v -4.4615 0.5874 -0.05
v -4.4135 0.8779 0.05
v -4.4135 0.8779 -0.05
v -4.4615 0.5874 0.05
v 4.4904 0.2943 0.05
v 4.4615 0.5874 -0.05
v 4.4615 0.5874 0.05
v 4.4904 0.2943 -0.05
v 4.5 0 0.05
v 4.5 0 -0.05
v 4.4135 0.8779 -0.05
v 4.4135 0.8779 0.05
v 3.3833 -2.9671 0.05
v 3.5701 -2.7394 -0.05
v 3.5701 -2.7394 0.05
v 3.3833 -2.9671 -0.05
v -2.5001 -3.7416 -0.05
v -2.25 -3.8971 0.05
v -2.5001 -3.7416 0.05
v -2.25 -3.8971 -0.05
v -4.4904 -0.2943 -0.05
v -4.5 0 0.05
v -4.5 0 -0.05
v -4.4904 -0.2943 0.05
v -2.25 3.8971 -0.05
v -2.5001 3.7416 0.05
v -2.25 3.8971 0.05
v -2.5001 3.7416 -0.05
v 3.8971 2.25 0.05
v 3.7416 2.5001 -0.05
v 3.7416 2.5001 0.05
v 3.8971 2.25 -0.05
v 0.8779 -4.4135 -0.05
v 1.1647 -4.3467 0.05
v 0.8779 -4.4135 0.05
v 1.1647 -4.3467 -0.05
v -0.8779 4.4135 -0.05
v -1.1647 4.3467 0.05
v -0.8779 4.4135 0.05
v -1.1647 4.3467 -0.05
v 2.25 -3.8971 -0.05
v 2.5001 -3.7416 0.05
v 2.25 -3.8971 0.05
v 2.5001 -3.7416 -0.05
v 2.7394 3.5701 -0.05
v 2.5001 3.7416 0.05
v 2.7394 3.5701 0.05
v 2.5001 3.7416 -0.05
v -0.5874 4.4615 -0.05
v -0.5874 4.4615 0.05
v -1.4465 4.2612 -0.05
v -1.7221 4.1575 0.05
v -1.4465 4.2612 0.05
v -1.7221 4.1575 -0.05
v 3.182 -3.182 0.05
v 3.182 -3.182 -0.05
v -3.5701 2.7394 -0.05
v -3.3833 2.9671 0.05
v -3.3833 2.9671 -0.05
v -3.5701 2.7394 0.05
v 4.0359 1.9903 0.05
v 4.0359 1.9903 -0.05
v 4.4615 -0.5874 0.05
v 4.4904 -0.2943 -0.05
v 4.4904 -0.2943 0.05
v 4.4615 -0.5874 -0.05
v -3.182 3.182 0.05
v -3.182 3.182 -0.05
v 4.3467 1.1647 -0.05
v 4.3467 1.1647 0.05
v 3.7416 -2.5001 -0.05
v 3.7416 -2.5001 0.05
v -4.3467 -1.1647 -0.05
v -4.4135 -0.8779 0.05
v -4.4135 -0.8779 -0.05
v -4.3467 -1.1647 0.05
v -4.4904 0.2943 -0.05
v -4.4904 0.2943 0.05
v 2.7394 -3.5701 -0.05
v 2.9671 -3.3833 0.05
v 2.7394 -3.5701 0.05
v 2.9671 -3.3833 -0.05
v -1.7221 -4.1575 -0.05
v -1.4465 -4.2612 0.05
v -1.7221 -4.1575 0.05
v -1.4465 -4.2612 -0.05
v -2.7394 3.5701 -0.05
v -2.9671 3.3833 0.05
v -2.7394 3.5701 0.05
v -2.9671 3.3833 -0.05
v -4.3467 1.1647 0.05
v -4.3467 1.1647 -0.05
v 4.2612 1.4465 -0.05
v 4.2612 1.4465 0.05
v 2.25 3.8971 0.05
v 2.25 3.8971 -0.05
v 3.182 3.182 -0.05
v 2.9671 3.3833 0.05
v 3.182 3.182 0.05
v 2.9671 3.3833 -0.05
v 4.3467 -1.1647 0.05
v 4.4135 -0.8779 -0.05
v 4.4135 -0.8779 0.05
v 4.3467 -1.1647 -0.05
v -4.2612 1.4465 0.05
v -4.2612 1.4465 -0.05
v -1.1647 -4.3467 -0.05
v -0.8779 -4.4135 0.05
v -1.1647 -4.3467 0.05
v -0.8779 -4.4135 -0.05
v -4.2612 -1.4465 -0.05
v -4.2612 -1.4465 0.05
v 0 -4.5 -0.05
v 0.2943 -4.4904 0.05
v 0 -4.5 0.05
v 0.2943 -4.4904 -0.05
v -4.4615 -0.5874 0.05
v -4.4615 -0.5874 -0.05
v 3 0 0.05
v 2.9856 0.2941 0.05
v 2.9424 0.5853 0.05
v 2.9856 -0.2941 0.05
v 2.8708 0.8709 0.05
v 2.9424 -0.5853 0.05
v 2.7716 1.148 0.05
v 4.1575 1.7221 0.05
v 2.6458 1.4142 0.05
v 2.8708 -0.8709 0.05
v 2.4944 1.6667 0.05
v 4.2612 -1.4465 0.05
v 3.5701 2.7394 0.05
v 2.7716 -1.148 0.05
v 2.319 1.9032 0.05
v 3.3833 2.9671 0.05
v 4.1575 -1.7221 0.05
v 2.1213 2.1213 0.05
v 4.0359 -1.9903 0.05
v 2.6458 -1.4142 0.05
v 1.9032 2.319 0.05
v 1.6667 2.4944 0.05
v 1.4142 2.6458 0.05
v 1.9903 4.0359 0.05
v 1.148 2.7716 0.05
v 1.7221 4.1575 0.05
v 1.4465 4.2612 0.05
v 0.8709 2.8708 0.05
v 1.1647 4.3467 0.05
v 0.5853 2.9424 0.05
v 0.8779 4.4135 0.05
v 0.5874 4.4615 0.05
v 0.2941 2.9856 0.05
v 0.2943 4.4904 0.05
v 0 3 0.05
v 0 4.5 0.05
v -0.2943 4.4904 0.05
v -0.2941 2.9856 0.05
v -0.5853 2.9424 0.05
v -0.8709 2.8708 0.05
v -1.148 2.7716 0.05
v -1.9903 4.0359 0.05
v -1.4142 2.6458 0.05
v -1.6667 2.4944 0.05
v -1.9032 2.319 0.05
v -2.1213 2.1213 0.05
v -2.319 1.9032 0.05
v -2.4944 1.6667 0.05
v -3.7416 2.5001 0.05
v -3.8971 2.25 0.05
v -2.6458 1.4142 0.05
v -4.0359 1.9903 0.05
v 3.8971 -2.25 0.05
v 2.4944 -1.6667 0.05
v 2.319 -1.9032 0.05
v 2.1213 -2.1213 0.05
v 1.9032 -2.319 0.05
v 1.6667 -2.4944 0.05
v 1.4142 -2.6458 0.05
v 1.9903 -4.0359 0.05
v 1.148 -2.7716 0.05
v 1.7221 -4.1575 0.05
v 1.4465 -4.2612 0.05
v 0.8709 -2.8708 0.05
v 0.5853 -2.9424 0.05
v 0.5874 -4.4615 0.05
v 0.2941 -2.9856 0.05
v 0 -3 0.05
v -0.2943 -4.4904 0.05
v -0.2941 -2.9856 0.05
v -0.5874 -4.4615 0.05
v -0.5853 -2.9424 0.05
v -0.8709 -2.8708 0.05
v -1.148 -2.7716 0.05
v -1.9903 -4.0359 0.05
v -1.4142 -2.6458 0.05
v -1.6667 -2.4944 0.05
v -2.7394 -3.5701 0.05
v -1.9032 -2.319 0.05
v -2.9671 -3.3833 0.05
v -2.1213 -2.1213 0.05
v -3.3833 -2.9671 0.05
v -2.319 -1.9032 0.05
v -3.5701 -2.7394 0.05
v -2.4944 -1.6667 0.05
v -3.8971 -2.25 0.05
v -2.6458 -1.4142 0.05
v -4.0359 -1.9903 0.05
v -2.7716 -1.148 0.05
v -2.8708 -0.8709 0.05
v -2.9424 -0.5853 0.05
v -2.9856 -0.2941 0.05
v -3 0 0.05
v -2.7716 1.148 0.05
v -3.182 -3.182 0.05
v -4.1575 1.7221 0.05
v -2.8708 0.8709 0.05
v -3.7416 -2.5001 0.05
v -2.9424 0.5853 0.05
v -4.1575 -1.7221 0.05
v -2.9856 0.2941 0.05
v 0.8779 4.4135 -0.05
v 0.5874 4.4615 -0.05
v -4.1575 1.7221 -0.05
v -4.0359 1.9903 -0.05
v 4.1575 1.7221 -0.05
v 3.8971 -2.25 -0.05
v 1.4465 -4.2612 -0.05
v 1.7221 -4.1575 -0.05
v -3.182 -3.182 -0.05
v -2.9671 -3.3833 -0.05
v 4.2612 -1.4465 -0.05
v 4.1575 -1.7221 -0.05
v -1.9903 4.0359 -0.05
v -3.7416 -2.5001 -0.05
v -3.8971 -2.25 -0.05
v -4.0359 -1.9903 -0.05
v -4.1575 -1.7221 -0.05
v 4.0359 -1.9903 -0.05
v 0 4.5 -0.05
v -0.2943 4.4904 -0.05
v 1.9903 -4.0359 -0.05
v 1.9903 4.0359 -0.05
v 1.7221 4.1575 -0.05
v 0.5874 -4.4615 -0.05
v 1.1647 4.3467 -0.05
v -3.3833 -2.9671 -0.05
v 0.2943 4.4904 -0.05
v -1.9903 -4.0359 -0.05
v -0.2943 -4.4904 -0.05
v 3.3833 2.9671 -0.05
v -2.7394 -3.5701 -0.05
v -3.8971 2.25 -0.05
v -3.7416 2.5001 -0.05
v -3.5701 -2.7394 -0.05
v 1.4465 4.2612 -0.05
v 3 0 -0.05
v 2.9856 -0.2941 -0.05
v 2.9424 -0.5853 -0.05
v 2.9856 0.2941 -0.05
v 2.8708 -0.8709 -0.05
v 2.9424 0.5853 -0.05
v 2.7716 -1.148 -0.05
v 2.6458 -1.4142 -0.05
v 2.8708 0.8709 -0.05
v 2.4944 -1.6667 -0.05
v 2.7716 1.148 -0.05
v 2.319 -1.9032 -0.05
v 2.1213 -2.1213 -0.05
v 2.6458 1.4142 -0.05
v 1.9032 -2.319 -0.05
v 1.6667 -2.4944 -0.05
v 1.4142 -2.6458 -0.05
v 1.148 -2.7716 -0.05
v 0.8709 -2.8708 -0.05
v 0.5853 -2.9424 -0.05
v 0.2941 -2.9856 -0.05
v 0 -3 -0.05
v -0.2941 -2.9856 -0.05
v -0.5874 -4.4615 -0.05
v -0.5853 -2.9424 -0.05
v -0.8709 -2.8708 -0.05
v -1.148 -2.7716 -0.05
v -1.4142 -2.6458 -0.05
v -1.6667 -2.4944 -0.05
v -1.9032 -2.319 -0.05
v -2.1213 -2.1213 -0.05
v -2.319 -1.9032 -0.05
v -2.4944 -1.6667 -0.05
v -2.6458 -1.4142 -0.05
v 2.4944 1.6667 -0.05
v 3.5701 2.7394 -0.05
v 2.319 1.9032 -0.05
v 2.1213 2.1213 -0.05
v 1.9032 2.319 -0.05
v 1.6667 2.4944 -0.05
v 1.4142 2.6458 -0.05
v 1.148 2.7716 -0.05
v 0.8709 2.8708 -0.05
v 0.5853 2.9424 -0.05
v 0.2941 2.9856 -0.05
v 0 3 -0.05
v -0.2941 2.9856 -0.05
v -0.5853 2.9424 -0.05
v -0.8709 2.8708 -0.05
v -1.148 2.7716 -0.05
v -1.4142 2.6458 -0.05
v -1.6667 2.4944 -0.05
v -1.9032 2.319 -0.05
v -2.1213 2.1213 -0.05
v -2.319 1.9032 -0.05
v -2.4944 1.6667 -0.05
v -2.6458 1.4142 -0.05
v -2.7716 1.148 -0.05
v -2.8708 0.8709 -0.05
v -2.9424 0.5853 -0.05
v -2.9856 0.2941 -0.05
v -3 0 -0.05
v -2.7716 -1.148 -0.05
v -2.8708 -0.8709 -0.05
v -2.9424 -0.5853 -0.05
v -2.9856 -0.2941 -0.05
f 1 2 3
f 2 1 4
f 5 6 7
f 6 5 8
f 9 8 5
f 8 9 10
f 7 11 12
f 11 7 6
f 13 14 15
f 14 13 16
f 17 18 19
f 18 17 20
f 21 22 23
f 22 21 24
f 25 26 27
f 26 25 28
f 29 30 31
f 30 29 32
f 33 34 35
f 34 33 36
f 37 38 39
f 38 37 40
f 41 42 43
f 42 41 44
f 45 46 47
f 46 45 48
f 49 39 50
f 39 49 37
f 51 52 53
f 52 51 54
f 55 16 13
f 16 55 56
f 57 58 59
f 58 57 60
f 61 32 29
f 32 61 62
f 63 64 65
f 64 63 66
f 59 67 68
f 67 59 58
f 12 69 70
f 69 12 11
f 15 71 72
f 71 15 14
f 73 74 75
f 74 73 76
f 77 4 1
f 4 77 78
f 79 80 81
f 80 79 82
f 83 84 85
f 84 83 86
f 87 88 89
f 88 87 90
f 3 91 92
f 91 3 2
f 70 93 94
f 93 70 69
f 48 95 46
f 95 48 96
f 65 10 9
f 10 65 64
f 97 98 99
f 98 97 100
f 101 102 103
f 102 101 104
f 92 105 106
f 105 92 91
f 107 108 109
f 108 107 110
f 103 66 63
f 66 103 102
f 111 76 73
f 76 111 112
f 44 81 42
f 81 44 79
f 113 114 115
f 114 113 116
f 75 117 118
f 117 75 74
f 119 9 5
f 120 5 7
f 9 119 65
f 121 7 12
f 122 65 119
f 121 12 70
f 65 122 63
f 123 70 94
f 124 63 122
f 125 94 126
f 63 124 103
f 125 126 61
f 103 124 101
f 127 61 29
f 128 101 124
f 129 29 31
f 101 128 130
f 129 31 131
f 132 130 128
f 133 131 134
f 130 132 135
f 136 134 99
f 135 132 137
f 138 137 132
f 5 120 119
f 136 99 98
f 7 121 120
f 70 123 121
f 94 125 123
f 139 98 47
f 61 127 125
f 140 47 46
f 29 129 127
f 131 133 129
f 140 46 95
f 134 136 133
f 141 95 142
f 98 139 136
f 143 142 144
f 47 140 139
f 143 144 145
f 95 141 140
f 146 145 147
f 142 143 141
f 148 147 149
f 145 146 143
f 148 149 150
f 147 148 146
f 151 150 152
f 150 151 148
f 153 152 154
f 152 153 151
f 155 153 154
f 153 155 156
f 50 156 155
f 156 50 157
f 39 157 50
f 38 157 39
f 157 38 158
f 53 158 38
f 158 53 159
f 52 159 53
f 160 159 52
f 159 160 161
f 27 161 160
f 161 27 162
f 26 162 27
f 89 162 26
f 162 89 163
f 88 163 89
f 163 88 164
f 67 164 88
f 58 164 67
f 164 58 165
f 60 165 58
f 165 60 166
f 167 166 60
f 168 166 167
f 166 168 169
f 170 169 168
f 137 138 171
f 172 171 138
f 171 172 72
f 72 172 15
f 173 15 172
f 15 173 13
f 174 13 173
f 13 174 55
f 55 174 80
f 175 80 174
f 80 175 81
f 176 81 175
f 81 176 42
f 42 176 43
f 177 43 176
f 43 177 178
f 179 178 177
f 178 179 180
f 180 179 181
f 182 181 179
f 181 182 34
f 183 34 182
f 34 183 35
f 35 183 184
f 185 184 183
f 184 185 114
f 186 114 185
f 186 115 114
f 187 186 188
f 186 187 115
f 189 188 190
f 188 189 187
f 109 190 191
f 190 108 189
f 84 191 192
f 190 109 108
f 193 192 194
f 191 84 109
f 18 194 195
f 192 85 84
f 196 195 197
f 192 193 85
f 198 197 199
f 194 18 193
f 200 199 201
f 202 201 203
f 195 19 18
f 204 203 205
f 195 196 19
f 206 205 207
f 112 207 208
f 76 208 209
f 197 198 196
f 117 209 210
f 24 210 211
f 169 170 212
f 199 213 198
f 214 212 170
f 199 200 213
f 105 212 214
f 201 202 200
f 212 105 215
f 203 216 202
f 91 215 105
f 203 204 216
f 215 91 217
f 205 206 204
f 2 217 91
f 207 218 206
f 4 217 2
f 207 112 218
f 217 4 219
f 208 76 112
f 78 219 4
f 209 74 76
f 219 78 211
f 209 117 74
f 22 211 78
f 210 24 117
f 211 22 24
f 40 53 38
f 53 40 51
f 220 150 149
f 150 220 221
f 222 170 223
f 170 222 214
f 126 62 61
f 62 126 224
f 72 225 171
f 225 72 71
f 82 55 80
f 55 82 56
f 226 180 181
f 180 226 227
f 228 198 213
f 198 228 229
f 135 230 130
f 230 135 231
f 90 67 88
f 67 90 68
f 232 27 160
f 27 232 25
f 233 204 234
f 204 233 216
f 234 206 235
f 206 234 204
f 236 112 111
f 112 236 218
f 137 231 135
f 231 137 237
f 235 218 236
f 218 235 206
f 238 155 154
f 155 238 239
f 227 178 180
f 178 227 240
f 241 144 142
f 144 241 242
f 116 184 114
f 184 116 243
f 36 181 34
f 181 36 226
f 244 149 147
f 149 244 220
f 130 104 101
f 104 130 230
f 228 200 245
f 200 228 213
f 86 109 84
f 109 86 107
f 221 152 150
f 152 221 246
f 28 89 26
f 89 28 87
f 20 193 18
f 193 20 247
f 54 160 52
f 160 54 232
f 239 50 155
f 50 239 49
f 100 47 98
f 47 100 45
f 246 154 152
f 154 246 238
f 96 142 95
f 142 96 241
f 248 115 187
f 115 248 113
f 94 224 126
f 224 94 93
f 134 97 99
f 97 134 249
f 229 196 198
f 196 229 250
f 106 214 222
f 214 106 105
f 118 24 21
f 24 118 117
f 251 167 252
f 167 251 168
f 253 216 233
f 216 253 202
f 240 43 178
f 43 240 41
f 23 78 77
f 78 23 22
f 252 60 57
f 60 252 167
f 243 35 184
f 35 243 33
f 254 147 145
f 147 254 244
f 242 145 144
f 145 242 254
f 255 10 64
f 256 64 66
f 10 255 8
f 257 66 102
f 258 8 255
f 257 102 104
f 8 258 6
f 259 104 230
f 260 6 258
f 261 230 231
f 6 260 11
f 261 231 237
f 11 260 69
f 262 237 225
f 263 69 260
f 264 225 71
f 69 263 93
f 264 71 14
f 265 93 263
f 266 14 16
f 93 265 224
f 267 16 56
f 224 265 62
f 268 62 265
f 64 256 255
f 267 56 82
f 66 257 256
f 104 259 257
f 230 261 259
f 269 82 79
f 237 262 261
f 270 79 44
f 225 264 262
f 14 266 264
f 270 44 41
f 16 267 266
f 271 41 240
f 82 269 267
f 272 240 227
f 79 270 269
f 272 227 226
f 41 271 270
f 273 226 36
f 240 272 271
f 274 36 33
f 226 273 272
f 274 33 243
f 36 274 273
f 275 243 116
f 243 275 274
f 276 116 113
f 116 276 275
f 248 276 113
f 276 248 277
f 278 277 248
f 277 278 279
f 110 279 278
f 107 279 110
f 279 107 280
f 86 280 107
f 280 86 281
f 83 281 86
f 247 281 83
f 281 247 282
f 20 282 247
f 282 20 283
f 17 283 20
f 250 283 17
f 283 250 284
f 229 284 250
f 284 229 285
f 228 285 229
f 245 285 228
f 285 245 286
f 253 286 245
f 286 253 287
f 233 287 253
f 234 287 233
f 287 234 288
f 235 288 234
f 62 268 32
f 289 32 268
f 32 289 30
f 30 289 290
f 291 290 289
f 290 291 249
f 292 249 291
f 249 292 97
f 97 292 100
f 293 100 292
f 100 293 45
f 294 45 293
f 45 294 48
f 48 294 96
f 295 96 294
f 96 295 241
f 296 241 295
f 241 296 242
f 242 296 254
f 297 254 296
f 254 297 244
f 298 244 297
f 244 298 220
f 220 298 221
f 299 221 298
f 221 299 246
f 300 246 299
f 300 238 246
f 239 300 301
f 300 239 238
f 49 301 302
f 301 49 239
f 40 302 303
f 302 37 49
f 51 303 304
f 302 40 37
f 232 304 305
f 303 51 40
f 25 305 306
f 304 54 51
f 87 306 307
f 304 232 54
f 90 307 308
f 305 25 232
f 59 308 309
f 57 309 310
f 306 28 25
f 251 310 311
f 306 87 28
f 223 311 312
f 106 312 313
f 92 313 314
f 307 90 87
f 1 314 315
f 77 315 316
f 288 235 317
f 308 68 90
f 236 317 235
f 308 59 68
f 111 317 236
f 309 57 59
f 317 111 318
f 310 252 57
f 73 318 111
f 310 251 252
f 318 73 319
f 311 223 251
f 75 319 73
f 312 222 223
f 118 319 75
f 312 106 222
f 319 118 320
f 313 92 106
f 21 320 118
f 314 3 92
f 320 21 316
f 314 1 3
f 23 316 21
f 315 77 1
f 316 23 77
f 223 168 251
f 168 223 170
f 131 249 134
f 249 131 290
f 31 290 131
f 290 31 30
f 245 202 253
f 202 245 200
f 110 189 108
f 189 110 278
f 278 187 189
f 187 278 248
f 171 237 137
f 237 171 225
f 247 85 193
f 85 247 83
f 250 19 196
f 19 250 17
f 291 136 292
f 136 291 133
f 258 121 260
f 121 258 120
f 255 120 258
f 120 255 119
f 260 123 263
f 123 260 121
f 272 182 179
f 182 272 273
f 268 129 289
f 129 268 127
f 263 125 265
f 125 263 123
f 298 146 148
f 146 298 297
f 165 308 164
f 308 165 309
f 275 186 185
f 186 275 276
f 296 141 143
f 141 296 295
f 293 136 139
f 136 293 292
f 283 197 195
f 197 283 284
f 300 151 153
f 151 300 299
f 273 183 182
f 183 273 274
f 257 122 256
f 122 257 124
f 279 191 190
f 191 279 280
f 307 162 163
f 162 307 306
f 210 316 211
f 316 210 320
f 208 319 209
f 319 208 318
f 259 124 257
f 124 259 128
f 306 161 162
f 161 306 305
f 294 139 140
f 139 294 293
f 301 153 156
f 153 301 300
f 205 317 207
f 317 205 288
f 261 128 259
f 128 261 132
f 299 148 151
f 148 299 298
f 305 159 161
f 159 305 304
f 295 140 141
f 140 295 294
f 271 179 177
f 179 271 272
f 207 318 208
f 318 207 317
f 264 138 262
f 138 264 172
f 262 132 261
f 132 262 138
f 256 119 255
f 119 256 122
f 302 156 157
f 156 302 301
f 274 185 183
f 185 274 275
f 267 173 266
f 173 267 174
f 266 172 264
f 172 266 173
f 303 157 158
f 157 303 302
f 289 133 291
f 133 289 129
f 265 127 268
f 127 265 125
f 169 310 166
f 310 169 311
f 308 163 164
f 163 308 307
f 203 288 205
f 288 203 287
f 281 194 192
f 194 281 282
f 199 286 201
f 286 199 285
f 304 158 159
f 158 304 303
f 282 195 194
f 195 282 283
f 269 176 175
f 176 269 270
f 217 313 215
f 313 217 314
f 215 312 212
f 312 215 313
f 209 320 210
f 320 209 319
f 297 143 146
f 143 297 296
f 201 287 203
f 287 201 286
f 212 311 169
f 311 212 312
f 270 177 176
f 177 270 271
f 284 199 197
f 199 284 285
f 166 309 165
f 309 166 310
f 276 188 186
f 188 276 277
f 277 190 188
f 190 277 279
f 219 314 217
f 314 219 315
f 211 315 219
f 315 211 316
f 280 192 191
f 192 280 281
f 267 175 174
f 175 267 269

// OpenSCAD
// part_id: d5
// name: D5 washer
// source_drawing_ids: DRW-004
// units: mm
// SPDX-License-Identifier: MIT
//
// Part D5: simple thin washer shown on DRW-004 sheet 14.
//
// Local origin convention:
// - XY origin is the washer axis.
// - Z origin is the part midplane.

module part_d5(
    outer_d = 9.0,
    inner_d = 6.0,
    thickness = 0.1
) {
    difference() {
        cylinder(d = outer_d, h = thickness, center = true, $fn = 96);
        cylinder(d = inner_d, h = thickness + 0.2, center = true, $fn = 64);
    }
}

// ---- "main guard" ----
if (is_undef(__LIB_MODE__)) {
    part_d5();
}
